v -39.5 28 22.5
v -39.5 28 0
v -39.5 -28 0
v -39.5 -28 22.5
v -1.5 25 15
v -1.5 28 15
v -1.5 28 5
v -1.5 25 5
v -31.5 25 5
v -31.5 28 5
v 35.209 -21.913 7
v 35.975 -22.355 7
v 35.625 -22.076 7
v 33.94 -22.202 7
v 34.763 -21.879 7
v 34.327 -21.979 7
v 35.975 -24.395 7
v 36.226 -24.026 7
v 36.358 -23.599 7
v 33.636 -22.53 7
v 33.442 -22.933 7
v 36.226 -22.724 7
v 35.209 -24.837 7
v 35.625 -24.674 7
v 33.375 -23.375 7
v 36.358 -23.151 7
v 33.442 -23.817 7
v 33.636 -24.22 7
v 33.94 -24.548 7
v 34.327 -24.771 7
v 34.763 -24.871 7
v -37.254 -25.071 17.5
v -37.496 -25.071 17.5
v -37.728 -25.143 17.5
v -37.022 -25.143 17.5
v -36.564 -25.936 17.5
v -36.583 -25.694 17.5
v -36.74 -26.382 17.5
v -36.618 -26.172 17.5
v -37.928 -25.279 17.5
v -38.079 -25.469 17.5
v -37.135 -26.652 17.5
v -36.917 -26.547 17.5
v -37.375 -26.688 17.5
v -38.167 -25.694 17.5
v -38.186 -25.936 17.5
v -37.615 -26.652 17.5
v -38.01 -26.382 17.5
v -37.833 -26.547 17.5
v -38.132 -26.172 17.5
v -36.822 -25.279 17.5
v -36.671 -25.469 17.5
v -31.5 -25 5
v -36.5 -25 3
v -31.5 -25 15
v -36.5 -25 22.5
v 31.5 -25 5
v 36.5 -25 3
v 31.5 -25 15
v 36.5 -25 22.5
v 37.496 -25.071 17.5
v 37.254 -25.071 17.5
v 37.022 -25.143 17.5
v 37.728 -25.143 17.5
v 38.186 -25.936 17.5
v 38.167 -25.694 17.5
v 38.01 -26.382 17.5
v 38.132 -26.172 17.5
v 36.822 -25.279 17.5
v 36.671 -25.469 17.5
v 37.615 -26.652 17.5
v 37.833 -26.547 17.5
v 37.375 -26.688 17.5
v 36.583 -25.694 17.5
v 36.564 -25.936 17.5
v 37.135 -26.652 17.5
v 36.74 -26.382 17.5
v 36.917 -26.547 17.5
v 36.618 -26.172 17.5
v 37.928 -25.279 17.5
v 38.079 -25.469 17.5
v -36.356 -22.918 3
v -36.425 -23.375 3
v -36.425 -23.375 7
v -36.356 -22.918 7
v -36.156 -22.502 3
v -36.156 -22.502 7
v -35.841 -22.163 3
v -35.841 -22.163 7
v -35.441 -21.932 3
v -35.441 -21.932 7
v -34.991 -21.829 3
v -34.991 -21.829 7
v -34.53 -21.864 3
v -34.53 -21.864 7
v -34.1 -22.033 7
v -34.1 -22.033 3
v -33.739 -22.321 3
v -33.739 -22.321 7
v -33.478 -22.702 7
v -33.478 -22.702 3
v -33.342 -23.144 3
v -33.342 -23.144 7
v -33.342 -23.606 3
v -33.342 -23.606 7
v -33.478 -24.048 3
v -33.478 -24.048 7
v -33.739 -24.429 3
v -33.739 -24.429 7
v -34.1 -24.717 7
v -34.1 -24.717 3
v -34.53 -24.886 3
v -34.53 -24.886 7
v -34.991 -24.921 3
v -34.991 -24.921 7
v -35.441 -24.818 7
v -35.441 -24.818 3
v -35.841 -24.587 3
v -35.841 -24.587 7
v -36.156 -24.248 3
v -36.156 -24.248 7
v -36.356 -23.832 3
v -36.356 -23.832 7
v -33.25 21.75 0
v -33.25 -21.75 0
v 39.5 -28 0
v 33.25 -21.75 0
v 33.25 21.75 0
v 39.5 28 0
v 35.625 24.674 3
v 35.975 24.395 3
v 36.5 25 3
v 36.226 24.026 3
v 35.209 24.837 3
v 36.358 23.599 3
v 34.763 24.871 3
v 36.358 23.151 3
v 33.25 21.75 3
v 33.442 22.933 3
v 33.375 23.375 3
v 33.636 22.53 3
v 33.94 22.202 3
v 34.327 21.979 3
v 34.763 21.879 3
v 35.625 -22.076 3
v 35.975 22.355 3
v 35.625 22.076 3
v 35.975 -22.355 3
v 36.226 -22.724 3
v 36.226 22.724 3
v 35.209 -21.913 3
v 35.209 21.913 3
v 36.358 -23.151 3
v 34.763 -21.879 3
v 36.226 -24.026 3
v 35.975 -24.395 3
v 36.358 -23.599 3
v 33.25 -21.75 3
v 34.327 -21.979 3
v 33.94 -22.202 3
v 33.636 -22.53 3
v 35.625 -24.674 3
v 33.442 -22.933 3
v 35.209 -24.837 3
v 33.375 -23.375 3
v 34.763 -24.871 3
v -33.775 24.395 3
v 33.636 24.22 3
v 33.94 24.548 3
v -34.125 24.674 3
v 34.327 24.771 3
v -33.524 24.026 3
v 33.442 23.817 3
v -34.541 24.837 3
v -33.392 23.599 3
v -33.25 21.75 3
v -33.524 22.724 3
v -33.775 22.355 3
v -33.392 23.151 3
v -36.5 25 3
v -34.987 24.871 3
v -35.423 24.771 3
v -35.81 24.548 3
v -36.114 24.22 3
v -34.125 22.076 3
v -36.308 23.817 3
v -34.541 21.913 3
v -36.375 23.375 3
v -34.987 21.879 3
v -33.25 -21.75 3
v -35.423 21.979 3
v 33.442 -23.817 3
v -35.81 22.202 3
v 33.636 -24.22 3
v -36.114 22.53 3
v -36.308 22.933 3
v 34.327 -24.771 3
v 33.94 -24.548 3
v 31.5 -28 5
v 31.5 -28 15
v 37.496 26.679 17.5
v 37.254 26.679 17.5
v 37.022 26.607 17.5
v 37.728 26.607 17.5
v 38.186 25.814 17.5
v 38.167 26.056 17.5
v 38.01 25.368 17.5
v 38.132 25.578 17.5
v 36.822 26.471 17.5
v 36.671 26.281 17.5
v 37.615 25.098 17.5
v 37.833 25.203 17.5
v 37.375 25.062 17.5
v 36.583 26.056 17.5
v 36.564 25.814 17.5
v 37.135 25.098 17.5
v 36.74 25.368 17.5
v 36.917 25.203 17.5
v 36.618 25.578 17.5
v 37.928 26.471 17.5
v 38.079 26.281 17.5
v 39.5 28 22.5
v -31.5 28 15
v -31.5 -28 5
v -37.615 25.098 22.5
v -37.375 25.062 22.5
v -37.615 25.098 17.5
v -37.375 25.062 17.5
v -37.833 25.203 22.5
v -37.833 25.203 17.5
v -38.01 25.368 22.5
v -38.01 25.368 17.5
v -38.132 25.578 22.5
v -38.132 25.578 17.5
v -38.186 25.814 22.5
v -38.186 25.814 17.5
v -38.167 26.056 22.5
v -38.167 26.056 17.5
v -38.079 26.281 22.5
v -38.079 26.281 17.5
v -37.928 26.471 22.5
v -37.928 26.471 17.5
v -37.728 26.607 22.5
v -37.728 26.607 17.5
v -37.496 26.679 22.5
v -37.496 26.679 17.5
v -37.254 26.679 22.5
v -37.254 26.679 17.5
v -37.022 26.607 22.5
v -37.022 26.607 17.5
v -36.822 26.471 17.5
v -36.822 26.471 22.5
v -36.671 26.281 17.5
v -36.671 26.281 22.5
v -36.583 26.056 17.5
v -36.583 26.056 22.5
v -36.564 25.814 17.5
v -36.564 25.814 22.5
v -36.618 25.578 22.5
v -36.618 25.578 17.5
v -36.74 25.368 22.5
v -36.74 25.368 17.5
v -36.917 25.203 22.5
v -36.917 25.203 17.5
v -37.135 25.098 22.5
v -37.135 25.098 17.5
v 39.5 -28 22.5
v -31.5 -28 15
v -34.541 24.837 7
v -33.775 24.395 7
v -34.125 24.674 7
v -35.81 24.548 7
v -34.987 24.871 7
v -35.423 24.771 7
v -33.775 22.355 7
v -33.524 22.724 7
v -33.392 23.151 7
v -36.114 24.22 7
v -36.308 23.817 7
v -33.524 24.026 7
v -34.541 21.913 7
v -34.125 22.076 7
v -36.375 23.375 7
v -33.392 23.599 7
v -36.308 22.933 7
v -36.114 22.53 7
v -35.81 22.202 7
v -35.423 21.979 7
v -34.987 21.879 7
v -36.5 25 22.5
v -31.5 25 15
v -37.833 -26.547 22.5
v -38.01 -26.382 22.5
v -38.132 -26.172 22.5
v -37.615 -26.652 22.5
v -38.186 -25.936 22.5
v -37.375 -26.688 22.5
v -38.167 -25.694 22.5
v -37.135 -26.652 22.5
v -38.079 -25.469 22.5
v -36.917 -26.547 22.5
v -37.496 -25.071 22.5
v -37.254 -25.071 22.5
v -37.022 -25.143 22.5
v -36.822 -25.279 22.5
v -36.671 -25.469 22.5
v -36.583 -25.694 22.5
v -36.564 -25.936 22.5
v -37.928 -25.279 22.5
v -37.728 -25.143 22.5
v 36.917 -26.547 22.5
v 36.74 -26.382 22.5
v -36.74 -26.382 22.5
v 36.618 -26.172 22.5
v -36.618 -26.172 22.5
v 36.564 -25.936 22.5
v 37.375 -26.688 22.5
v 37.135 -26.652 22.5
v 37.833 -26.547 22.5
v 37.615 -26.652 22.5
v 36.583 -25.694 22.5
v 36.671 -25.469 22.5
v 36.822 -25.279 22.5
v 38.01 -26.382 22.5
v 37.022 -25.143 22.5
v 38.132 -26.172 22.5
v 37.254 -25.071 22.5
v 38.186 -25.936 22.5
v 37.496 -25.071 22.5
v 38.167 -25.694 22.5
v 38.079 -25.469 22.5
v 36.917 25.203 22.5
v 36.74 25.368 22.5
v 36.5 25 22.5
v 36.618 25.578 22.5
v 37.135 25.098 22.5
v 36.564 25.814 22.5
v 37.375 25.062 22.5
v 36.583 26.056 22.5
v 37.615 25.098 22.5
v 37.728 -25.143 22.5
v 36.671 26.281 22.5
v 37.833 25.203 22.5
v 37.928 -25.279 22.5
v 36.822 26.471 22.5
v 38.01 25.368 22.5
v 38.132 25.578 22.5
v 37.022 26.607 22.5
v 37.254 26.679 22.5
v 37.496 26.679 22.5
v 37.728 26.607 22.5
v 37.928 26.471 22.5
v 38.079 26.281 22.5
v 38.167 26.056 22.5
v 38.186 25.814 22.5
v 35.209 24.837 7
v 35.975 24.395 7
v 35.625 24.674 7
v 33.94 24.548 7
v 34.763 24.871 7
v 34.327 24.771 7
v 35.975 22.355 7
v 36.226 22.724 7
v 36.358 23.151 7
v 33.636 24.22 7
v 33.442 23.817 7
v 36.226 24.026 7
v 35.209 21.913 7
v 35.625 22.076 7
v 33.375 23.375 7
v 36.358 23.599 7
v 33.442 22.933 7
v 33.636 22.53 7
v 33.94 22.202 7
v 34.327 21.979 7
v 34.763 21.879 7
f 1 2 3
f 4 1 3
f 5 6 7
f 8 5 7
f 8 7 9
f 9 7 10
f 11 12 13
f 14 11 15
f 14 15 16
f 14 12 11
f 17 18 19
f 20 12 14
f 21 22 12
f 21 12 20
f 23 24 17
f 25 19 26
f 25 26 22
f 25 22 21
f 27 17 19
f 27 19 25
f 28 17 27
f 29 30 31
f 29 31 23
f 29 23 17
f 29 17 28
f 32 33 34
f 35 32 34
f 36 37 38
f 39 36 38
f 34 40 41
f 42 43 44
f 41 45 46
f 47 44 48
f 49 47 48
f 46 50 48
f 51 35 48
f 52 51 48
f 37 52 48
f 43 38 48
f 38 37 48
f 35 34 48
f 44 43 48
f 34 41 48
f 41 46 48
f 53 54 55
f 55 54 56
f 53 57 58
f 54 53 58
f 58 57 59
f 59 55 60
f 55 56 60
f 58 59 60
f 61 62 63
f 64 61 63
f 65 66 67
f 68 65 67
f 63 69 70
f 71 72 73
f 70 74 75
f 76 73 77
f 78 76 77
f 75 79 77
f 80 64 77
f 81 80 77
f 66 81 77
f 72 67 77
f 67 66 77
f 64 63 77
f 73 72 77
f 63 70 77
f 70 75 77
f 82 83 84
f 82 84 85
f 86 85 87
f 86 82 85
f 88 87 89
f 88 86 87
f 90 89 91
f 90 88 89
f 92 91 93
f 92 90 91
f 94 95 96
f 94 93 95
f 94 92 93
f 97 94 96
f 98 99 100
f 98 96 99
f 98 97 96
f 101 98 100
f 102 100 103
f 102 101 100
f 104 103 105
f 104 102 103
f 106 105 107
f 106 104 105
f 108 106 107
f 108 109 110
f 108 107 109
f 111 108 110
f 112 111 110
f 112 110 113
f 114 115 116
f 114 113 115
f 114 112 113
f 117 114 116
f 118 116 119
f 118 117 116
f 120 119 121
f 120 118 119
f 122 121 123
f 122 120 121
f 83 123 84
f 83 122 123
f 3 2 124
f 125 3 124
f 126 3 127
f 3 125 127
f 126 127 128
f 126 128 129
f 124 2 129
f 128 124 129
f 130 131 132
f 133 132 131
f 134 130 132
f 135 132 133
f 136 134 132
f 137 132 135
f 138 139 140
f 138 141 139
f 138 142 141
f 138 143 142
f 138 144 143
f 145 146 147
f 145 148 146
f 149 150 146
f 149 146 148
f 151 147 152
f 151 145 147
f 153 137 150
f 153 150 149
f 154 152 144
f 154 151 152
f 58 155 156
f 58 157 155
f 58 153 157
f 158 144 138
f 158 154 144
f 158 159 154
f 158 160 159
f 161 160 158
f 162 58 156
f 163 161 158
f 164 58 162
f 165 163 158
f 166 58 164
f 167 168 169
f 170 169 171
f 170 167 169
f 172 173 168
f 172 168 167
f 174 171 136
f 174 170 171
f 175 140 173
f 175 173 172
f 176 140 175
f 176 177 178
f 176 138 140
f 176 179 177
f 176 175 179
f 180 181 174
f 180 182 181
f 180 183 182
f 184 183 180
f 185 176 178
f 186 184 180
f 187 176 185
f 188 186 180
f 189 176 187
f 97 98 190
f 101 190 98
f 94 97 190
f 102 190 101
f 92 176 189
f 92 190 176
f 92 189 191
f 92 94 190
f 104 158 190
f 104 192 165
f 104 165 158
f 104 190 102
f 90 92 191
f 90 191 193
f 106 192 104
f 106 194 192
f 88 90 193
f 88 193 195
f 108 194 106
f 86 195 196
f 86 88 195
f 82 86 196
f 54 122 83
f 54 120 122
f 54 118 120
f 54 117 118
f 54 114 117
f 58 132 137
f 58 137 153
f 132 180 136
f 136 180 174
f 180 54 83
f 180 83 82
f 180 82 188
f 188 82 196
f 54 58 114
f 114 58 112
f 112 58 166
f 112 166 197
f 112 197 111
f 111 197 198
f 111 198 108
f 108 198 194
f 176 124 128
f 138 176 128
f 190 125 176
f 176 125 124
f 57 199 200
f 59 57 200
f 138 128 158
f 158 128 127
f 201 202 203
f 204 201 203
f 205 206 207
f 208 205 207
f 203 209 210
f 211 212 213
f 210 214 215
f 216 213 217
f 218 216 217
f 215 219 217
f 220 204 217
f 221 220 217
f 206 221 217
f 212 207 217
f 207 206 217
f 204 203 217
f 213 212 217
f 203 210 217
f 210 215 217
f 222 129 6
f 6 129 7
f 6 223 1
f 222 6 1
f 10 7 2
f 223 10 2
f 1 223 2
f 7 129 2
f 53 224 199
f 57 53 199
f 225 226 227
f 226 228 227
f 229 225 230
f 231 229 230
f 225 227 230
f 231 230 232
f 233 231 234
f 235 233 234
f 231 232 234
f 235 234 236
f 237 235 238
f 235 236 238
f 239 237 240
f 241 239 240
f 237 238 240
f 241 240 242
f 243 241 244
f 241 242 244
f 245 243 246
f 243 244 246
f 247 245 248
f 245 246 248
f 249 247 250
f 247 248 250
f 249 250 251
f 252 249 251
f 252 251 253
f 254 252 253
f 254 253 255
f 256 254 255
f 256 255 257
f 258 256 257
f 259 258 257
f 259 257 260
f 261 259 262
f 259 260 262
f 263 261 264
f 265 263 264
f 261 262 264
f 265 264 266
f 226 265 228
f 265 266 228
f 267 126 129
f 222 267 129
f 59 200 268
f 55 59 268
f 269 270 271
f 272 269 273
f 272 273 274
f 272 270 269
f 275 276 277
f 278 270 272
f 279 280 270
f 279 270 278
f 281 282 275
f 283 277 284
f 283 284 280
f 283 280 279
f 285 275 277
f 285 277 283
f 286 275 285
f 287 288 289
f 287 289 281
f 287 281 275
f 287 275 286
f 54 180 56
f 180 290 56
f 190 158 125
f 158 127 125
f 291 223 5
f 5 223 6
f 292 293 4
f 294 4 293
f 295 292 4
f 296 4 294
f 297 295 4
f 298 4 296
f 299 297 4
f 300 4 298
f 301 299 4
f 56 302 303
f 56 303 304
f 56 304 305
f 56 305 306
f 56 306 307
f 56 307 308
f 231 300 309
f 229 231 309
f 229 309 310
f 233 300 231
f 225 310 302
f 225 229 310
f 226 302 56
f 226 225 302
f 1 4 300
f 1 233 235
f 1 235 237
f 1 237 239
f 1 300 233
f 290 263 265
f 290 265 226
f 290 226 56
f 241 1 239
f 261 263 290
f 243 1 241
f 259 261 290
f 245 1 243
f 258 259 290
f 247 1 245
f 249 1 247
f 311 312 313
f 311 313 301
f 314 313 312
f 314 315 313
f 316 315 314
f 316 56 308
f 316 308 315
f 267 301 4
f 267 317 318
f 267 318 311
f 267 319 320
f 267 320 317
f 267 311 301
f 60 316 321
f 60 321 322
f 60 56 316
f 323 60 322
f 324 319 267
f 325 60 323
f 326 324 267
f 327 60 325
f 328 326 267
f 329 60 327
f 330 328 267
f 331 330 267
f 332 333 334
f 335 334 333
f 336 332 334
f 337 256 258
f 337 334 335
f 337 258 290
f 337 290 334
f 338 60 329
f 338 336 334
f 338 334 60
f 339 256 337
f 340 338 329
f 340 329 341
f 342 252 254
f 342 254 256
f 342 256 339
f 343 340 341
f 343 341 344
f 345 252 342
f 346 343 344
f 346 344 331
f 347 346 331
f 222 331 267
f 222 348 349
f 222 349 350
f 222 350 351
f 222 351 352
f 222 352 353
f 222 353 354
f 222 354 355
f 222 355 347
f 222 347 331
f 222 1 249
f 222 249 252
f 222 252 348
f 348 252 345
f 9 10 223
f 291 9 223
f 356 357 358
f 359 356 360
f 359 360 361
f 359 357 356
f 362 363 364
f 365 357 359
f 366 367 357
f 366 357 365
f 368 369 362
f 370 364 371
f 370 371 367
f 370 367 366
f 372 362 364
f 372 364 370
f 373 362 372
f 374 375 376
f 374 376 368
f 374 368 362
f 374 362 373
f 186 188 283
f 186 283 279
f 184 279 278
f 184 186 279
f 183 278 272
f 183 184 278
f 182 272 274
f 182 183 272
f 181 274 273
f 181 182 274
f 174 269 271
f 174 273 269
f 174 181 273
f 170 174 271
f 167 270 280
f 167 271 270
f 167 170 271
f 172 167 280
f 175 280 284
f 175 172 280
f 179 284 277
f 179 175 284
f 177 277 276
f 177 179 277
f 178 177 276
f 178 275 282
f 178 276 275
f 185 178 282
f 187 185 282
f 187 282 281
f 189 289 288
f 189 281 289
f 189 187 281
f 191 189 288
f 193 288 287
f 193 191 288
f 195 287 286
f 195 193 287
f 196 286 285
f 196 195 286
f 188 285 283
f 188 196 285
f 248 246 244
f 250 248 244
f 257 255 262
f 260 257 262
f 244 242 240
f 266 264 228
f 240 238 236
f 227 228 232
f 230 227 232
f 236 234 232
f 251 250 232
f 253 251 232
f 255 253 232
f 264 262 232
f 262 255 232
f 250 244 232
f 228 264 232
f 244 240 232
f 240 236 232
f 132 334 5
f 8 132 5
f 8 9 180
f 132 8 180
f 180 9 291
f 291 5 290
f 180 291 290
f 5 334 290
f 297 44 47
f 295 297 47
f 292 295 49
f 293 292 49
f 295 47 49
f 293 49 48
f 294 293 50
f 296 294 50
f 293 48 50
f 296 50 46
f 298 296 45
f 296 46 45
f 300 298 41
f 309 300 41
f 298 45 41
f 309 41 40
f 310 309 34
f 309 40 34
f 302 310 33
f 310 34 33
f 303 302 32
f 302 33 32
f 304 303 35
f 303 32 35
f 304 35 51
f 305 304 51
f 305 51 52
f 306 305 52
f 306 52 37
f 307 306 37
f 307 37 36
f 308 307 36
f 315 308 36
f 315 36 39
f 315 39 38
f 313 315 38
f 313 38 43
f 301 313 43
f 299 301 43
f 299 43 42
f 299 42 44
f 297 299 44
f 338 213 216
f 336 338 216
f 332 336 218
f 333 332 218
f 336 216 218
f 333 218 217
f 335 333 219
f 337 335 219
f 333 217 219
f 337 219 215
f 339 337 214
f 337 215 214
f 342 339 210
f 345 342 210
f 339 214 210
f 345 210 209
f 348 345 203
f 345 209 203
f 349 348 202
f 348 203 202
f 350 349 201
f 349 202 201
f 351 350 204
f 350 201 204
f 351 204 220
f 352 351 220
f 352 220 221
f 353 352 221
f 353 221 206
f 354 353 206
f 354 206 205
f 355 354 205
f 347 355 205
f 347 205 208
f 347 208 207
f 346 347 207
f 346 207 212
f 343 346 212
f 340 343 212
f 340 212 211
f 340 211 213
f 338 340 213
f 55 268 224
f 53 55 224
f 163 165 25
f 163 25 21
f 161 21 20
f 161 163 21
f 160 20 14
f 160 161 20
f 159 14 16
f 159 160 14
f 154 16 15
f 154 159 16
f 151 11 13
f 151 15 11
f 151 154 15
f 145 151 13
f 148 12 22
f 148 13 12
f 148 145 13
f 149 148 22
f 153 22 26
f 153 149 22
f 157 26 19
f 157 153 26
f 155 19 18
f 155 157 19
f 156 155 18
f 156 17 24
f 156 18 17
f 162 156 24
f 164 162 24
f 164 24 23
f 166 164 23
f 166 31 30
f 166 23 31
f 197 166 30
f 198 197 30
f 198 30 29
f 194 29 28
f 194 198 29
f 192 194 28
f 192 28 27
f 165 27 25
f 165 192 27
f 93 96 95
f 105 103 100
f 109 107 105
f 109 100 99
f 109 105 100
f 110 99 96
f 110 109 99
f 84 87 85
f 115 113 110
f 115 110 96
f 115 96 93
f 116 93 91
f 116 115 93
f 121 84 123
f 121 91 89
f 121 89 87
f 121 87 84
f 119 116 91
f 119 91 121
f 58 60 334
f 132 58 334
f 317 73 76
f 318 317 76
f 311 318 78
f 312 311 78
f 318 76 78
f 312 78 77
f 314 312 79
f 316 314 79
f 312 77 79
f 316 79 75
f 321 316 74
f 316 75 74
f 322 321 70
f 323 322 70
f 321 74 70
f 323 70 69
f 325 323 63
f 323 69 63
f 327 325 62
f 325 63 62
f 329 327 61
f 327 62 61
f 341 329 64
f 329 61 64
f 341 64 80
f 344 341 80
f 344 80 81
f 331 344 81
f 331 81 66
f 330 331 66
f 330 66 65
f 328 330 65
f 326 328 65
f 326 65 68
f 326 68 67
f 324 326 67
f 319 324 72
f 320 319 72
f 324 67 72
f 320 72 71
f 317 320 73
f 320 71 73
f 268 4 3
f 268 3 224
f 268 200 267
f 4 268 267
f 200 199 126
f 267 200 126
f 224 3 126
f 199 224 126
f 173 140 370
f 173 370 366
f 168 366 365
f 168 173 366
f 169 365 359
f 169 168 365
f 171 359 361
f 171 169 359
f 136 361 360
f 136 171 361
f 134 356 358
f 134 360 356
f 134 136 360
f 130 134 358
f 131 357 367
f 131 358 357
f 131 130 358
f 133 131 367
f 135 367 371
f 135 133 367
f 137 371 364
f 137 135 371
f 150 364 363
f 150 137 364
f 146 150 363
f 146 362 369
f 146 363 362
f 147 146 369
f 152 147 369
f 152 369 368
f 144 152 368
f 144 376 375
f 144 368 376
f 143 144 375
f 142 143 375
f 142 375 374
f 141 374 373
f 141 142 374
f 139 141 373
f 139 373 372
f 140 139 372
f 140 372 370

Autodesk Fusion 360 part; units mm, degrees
sketch "Sketch1" plane through (0, 0, 0) normal (0, 0, 1) x (1, 0, 0)
  line L0 (39.5, 28) -> (-39.5, 28)
  line L1 (-39.5, 28) -> (-39.5, -28)
  line L2 (-39.5, -28) -> (39.5, -28)
  line L3 (39.5, -28) -> (39.5, 28)
  line L4 (39.5, 28) -> (-39.5, -28) construction
  line L5 (-39.5, 28) -> (39.5, -28) construction
  dimension "d1" = 79
  dimension "d2" = 56
extrude "Extrude1" add sketch "Sketch1" along normal blind 22.5
sketch "Sketch2" plane through (0, 0, 22.5) normal (0, 0, 1) x (-1, 0, 0)
  line L0 (-39.5, 28) -> (-39.5, -28)
  line L1 (-39.5, -28) -> (39.5, -28)
  line L2 (39.5, -28) -> (39.5, 28)
  line L3 (39.5, 28) -> (-39.5, 28)
  line L4 (-36.5, -25) -> (36.5, -25)
  line L5 (36.5, -25) -> (36.5, 25)
  line L6 (36.5, 25) -> (-36.5, 25)
  line L7 (-36.5, 25) -> (-36.5, -25)
  line L8 (-36.5, -25) -> (36.5, 25) construction
  line L9 (36.5, -25) -> (-36.5, 25) construction
  dimension "d5" = 73
  dimension "d6" = 50
extrude "Extrude2" cut sketch "Sketch2" against normal blind 19.5 contours L4 L5 L6 L7
sketch "Sketch3" plane through (0, 0, 0) normal (0, 0, -1) x (1, 0, 0)
  line L0 (39.5, -28) -> (39.5, 28)
  line L1 (39.5, 28) -> (-39.5, 28)
  line L2 (-39.5, 28) -> (-39.5, -28)
  line L3 (-39.5, -28) -> (39.5, -28)
  line L4 (33.25, 21.75) -> (-33.25, 21.75)
  line L5 (-33.25, 21.75) -> (-33.25, -21.75)
  line L6 (-33.25, -21.75) -> (33.25, -21.75)
  line L7 (33.25, -21.75) -> (33.25, 21.75)
  line L8 (33.25, 21.75) -> (-33.25, -21.75) construction
  line L9 (-33.25, 21.75) -> (33.25, -21.75) construction
  dimension "d9" = 66.5
  dimension "d10" = 43.5
sketch "Sketch4" plane through (0, 0, 0) normal (0, 0, -1) x (1, 0, 0)
extrude "Extrude3" cut sketch "Sketch3" against normal blind 3 contours L4 L5 L6 L7
sketch "Sketch5" plane through (0, 0, 3) normal (0, 0, 1) x (-1, 0, 0)
  line L0 (-33.25, 21.75) -> (33.25, 21.75)
  line L1 (33.25, 21.75) -> (33.25, -21.75)
  line L2 (33.25, -21.75) -> (-33.25, -21.75)
  line L3 (-33.25, -21.75) -> (-33.25, 21.75)
  line L4 (-36.5, 25) -> (-36.5, -25)
  line L5 (-36.5, -25) -> (36.5, -25)
  line L6 (36.5, -25) -> (36.5, 25)
  line L7 (36.5, 25) -> (-36.5, 25)
  circle A0 centre (34.875, -23.375) radius 1.5
  dimension "d13" = 3
  dimension "d14" = 1.625
  dimension "d15" = 1.625
sketch "Sketch6" plane through (0, 0, 3) normal (0, 0, 1) x (-1, 0, 0)
  circle A0 centre (-34.875, -23.375) radius 1.5
  line L0 (-36.5, -25) -> (36.5, -25)
  line L1 (-36.5, 25) -> (-36.5, -25)
  circle A1 centre (-34.875, 23.375) radius 1.5
  line L2 (36.5, 25) -> (-36.5, 25)
  circle A2 centre (34.875, 23.375) radius 1.5
  line L3 (36.5, -25) -> (36.5, 25)
  dimension "d16" = 3
  dimension "d17" = 1.625
  dimension "d18" = 1.625
  dimension "d19" = 3
  dimension "d20" = 1.625
  dimension "d21" = 1.625
  dimension "d25" = 3
  dimension "d26" = 1.625
  dimension "d27" = 1.625
sketch "Sketch7" plane through (0, 0, 3) normal (0, 0, 1) x (-1, 0, 0)
  circle A0 centre (34.875, 23.375) radius 1.55
  line L0 (36.5, 25) -> (-36.5, 25)
  line L1 (36.5, -25) -> (36.5, 25)
  dimension "d22" = 3.1
  dimension "d23" = 1.625
  dimension "d24" = 1.625
extrude "Extrude4" add sketch "Sketch5" sketch "Sketch7" sketch "Sketch6" along normal blind 4 contours A0 of sketch 2 of sketch 3 contours A0 | A1
sketch "Sketch8" plane through (0, -28, 0) normal (0, -1, 0) x (1, 0, 0)
  line L0 (-39.5, 0) -> (39.5, 0)
  line L1 (39.5, 0) -> (39.5, 22.5)
  line L2 (39.5, 22.5) -> (-39.5, 22.5)
  line L3 (-39.5, 22.5) -> (-39.5, 0)
  line L4 (31.5, 15) -> (-31.5, 15)
  line L5 (-31.5, 15) -> (-31.5, 5)
  line L6 (-31.5, 5) -> (31.5, 5)
  line L7 (31.5, 5) -> (31.5, 15)
  line L8 (31.5, 15) -> (-31.5, 5) construction
  line L9 (-31.5, 15) -> (31.5, 5) construction
  point P0 (0, 10)
  dimension "d30" = 63
  dimension "d31" = 10
  dimension "d33" = 15
extrude "Extrude5" cut sketch "Sketch8" against normal blind 3 contours L4 L5 L6 L7
sketch "Sketch9" plane through (0, 28, 0) normal (0, 1, 0) x (-1, 0, 0)
  line L0 (-39.5, 0) -> (39.5, 0)
  line L1 (39.5, 0) -> (39.5, 22.5)
  line L2 (39.5, 22.5) -> (-39.5, 22.5)
  line L3 (-39.5, 22.5) -> (-39.5, 0)
  line L4 (31.5, 15) -> (1.5, 15)
  line L5 (1.5, 15) -> (1.5, 5)
  line L6 (1.5, 5) -> (31.5, 5)
  line L7 (31.5, 5) -> (31.5, 15)
  line L8 (31.5, 15) -> (1.5, 5) construction
  line L9 (1.5, 15) -> (31.5, 5) construction
  point P0 (16.5, 10)
  dimension "d36" = 30
  dimension "d37" = 10
  dimension "d38" = 8
  dimension "d39" = 15
extrude "Extrude6" cut sketch "Sketch9" against normal blind 3 contours L4 L5 L6 L7
sketch "Sketch11" plane through (0, 0, 22.5) normal (0, 0, 1) x (-1, 0, 0)
  line L0 (36.5, -25) -> (-36.5, -25)
  line L1 (-36.5, -25) -> (-36.5, 25)
  line L2 (-36.5, 25) -> (36.5, 25)
  line L3 (36.5, 25) -> (36.5, -25)
  line L4 (-39.5, 28) -> (-39.5, -28)
  line L5 (-39.5, -28) -> (39.5, -28)
  line L6 (39.5, -28) -> (39.5, 28)
  line L7 (39.5, 28) -> (-39.5, 28)
  circle A0 centre (37.375, -25.875) radius 1
  circle A1 centre (37.375, 25.875) radius 1
  circle A2 centre (-37.375, 25.875) radius 1
  circle A3 centre (-37.375, -25.875) radius 1
  dimension "d56" = 2
  dimension "d57" = 2
  dimension "d58" = 2
  dimension "d59" = 2
  dimension "d60" = 2.125
  dimension "d61" = 2.125
  dimension "d62" = 2.125
  dimension "d63" = 2.125
  dimension "d64" = 2.125
  dimension "d65" = 2.125
  dimension "d66" = 2.125
  dimension "d67" = 2.125
hole "Hole1" at (-37.375, 25.875, 22.5) at (37.375, 25.875, 22.5) at (37.375, -25.875, 22.5) at (-37.375, -25.875, 22.5) direction (0, 0, -1) diameter 1.6256 depth 5 tip angle 180
